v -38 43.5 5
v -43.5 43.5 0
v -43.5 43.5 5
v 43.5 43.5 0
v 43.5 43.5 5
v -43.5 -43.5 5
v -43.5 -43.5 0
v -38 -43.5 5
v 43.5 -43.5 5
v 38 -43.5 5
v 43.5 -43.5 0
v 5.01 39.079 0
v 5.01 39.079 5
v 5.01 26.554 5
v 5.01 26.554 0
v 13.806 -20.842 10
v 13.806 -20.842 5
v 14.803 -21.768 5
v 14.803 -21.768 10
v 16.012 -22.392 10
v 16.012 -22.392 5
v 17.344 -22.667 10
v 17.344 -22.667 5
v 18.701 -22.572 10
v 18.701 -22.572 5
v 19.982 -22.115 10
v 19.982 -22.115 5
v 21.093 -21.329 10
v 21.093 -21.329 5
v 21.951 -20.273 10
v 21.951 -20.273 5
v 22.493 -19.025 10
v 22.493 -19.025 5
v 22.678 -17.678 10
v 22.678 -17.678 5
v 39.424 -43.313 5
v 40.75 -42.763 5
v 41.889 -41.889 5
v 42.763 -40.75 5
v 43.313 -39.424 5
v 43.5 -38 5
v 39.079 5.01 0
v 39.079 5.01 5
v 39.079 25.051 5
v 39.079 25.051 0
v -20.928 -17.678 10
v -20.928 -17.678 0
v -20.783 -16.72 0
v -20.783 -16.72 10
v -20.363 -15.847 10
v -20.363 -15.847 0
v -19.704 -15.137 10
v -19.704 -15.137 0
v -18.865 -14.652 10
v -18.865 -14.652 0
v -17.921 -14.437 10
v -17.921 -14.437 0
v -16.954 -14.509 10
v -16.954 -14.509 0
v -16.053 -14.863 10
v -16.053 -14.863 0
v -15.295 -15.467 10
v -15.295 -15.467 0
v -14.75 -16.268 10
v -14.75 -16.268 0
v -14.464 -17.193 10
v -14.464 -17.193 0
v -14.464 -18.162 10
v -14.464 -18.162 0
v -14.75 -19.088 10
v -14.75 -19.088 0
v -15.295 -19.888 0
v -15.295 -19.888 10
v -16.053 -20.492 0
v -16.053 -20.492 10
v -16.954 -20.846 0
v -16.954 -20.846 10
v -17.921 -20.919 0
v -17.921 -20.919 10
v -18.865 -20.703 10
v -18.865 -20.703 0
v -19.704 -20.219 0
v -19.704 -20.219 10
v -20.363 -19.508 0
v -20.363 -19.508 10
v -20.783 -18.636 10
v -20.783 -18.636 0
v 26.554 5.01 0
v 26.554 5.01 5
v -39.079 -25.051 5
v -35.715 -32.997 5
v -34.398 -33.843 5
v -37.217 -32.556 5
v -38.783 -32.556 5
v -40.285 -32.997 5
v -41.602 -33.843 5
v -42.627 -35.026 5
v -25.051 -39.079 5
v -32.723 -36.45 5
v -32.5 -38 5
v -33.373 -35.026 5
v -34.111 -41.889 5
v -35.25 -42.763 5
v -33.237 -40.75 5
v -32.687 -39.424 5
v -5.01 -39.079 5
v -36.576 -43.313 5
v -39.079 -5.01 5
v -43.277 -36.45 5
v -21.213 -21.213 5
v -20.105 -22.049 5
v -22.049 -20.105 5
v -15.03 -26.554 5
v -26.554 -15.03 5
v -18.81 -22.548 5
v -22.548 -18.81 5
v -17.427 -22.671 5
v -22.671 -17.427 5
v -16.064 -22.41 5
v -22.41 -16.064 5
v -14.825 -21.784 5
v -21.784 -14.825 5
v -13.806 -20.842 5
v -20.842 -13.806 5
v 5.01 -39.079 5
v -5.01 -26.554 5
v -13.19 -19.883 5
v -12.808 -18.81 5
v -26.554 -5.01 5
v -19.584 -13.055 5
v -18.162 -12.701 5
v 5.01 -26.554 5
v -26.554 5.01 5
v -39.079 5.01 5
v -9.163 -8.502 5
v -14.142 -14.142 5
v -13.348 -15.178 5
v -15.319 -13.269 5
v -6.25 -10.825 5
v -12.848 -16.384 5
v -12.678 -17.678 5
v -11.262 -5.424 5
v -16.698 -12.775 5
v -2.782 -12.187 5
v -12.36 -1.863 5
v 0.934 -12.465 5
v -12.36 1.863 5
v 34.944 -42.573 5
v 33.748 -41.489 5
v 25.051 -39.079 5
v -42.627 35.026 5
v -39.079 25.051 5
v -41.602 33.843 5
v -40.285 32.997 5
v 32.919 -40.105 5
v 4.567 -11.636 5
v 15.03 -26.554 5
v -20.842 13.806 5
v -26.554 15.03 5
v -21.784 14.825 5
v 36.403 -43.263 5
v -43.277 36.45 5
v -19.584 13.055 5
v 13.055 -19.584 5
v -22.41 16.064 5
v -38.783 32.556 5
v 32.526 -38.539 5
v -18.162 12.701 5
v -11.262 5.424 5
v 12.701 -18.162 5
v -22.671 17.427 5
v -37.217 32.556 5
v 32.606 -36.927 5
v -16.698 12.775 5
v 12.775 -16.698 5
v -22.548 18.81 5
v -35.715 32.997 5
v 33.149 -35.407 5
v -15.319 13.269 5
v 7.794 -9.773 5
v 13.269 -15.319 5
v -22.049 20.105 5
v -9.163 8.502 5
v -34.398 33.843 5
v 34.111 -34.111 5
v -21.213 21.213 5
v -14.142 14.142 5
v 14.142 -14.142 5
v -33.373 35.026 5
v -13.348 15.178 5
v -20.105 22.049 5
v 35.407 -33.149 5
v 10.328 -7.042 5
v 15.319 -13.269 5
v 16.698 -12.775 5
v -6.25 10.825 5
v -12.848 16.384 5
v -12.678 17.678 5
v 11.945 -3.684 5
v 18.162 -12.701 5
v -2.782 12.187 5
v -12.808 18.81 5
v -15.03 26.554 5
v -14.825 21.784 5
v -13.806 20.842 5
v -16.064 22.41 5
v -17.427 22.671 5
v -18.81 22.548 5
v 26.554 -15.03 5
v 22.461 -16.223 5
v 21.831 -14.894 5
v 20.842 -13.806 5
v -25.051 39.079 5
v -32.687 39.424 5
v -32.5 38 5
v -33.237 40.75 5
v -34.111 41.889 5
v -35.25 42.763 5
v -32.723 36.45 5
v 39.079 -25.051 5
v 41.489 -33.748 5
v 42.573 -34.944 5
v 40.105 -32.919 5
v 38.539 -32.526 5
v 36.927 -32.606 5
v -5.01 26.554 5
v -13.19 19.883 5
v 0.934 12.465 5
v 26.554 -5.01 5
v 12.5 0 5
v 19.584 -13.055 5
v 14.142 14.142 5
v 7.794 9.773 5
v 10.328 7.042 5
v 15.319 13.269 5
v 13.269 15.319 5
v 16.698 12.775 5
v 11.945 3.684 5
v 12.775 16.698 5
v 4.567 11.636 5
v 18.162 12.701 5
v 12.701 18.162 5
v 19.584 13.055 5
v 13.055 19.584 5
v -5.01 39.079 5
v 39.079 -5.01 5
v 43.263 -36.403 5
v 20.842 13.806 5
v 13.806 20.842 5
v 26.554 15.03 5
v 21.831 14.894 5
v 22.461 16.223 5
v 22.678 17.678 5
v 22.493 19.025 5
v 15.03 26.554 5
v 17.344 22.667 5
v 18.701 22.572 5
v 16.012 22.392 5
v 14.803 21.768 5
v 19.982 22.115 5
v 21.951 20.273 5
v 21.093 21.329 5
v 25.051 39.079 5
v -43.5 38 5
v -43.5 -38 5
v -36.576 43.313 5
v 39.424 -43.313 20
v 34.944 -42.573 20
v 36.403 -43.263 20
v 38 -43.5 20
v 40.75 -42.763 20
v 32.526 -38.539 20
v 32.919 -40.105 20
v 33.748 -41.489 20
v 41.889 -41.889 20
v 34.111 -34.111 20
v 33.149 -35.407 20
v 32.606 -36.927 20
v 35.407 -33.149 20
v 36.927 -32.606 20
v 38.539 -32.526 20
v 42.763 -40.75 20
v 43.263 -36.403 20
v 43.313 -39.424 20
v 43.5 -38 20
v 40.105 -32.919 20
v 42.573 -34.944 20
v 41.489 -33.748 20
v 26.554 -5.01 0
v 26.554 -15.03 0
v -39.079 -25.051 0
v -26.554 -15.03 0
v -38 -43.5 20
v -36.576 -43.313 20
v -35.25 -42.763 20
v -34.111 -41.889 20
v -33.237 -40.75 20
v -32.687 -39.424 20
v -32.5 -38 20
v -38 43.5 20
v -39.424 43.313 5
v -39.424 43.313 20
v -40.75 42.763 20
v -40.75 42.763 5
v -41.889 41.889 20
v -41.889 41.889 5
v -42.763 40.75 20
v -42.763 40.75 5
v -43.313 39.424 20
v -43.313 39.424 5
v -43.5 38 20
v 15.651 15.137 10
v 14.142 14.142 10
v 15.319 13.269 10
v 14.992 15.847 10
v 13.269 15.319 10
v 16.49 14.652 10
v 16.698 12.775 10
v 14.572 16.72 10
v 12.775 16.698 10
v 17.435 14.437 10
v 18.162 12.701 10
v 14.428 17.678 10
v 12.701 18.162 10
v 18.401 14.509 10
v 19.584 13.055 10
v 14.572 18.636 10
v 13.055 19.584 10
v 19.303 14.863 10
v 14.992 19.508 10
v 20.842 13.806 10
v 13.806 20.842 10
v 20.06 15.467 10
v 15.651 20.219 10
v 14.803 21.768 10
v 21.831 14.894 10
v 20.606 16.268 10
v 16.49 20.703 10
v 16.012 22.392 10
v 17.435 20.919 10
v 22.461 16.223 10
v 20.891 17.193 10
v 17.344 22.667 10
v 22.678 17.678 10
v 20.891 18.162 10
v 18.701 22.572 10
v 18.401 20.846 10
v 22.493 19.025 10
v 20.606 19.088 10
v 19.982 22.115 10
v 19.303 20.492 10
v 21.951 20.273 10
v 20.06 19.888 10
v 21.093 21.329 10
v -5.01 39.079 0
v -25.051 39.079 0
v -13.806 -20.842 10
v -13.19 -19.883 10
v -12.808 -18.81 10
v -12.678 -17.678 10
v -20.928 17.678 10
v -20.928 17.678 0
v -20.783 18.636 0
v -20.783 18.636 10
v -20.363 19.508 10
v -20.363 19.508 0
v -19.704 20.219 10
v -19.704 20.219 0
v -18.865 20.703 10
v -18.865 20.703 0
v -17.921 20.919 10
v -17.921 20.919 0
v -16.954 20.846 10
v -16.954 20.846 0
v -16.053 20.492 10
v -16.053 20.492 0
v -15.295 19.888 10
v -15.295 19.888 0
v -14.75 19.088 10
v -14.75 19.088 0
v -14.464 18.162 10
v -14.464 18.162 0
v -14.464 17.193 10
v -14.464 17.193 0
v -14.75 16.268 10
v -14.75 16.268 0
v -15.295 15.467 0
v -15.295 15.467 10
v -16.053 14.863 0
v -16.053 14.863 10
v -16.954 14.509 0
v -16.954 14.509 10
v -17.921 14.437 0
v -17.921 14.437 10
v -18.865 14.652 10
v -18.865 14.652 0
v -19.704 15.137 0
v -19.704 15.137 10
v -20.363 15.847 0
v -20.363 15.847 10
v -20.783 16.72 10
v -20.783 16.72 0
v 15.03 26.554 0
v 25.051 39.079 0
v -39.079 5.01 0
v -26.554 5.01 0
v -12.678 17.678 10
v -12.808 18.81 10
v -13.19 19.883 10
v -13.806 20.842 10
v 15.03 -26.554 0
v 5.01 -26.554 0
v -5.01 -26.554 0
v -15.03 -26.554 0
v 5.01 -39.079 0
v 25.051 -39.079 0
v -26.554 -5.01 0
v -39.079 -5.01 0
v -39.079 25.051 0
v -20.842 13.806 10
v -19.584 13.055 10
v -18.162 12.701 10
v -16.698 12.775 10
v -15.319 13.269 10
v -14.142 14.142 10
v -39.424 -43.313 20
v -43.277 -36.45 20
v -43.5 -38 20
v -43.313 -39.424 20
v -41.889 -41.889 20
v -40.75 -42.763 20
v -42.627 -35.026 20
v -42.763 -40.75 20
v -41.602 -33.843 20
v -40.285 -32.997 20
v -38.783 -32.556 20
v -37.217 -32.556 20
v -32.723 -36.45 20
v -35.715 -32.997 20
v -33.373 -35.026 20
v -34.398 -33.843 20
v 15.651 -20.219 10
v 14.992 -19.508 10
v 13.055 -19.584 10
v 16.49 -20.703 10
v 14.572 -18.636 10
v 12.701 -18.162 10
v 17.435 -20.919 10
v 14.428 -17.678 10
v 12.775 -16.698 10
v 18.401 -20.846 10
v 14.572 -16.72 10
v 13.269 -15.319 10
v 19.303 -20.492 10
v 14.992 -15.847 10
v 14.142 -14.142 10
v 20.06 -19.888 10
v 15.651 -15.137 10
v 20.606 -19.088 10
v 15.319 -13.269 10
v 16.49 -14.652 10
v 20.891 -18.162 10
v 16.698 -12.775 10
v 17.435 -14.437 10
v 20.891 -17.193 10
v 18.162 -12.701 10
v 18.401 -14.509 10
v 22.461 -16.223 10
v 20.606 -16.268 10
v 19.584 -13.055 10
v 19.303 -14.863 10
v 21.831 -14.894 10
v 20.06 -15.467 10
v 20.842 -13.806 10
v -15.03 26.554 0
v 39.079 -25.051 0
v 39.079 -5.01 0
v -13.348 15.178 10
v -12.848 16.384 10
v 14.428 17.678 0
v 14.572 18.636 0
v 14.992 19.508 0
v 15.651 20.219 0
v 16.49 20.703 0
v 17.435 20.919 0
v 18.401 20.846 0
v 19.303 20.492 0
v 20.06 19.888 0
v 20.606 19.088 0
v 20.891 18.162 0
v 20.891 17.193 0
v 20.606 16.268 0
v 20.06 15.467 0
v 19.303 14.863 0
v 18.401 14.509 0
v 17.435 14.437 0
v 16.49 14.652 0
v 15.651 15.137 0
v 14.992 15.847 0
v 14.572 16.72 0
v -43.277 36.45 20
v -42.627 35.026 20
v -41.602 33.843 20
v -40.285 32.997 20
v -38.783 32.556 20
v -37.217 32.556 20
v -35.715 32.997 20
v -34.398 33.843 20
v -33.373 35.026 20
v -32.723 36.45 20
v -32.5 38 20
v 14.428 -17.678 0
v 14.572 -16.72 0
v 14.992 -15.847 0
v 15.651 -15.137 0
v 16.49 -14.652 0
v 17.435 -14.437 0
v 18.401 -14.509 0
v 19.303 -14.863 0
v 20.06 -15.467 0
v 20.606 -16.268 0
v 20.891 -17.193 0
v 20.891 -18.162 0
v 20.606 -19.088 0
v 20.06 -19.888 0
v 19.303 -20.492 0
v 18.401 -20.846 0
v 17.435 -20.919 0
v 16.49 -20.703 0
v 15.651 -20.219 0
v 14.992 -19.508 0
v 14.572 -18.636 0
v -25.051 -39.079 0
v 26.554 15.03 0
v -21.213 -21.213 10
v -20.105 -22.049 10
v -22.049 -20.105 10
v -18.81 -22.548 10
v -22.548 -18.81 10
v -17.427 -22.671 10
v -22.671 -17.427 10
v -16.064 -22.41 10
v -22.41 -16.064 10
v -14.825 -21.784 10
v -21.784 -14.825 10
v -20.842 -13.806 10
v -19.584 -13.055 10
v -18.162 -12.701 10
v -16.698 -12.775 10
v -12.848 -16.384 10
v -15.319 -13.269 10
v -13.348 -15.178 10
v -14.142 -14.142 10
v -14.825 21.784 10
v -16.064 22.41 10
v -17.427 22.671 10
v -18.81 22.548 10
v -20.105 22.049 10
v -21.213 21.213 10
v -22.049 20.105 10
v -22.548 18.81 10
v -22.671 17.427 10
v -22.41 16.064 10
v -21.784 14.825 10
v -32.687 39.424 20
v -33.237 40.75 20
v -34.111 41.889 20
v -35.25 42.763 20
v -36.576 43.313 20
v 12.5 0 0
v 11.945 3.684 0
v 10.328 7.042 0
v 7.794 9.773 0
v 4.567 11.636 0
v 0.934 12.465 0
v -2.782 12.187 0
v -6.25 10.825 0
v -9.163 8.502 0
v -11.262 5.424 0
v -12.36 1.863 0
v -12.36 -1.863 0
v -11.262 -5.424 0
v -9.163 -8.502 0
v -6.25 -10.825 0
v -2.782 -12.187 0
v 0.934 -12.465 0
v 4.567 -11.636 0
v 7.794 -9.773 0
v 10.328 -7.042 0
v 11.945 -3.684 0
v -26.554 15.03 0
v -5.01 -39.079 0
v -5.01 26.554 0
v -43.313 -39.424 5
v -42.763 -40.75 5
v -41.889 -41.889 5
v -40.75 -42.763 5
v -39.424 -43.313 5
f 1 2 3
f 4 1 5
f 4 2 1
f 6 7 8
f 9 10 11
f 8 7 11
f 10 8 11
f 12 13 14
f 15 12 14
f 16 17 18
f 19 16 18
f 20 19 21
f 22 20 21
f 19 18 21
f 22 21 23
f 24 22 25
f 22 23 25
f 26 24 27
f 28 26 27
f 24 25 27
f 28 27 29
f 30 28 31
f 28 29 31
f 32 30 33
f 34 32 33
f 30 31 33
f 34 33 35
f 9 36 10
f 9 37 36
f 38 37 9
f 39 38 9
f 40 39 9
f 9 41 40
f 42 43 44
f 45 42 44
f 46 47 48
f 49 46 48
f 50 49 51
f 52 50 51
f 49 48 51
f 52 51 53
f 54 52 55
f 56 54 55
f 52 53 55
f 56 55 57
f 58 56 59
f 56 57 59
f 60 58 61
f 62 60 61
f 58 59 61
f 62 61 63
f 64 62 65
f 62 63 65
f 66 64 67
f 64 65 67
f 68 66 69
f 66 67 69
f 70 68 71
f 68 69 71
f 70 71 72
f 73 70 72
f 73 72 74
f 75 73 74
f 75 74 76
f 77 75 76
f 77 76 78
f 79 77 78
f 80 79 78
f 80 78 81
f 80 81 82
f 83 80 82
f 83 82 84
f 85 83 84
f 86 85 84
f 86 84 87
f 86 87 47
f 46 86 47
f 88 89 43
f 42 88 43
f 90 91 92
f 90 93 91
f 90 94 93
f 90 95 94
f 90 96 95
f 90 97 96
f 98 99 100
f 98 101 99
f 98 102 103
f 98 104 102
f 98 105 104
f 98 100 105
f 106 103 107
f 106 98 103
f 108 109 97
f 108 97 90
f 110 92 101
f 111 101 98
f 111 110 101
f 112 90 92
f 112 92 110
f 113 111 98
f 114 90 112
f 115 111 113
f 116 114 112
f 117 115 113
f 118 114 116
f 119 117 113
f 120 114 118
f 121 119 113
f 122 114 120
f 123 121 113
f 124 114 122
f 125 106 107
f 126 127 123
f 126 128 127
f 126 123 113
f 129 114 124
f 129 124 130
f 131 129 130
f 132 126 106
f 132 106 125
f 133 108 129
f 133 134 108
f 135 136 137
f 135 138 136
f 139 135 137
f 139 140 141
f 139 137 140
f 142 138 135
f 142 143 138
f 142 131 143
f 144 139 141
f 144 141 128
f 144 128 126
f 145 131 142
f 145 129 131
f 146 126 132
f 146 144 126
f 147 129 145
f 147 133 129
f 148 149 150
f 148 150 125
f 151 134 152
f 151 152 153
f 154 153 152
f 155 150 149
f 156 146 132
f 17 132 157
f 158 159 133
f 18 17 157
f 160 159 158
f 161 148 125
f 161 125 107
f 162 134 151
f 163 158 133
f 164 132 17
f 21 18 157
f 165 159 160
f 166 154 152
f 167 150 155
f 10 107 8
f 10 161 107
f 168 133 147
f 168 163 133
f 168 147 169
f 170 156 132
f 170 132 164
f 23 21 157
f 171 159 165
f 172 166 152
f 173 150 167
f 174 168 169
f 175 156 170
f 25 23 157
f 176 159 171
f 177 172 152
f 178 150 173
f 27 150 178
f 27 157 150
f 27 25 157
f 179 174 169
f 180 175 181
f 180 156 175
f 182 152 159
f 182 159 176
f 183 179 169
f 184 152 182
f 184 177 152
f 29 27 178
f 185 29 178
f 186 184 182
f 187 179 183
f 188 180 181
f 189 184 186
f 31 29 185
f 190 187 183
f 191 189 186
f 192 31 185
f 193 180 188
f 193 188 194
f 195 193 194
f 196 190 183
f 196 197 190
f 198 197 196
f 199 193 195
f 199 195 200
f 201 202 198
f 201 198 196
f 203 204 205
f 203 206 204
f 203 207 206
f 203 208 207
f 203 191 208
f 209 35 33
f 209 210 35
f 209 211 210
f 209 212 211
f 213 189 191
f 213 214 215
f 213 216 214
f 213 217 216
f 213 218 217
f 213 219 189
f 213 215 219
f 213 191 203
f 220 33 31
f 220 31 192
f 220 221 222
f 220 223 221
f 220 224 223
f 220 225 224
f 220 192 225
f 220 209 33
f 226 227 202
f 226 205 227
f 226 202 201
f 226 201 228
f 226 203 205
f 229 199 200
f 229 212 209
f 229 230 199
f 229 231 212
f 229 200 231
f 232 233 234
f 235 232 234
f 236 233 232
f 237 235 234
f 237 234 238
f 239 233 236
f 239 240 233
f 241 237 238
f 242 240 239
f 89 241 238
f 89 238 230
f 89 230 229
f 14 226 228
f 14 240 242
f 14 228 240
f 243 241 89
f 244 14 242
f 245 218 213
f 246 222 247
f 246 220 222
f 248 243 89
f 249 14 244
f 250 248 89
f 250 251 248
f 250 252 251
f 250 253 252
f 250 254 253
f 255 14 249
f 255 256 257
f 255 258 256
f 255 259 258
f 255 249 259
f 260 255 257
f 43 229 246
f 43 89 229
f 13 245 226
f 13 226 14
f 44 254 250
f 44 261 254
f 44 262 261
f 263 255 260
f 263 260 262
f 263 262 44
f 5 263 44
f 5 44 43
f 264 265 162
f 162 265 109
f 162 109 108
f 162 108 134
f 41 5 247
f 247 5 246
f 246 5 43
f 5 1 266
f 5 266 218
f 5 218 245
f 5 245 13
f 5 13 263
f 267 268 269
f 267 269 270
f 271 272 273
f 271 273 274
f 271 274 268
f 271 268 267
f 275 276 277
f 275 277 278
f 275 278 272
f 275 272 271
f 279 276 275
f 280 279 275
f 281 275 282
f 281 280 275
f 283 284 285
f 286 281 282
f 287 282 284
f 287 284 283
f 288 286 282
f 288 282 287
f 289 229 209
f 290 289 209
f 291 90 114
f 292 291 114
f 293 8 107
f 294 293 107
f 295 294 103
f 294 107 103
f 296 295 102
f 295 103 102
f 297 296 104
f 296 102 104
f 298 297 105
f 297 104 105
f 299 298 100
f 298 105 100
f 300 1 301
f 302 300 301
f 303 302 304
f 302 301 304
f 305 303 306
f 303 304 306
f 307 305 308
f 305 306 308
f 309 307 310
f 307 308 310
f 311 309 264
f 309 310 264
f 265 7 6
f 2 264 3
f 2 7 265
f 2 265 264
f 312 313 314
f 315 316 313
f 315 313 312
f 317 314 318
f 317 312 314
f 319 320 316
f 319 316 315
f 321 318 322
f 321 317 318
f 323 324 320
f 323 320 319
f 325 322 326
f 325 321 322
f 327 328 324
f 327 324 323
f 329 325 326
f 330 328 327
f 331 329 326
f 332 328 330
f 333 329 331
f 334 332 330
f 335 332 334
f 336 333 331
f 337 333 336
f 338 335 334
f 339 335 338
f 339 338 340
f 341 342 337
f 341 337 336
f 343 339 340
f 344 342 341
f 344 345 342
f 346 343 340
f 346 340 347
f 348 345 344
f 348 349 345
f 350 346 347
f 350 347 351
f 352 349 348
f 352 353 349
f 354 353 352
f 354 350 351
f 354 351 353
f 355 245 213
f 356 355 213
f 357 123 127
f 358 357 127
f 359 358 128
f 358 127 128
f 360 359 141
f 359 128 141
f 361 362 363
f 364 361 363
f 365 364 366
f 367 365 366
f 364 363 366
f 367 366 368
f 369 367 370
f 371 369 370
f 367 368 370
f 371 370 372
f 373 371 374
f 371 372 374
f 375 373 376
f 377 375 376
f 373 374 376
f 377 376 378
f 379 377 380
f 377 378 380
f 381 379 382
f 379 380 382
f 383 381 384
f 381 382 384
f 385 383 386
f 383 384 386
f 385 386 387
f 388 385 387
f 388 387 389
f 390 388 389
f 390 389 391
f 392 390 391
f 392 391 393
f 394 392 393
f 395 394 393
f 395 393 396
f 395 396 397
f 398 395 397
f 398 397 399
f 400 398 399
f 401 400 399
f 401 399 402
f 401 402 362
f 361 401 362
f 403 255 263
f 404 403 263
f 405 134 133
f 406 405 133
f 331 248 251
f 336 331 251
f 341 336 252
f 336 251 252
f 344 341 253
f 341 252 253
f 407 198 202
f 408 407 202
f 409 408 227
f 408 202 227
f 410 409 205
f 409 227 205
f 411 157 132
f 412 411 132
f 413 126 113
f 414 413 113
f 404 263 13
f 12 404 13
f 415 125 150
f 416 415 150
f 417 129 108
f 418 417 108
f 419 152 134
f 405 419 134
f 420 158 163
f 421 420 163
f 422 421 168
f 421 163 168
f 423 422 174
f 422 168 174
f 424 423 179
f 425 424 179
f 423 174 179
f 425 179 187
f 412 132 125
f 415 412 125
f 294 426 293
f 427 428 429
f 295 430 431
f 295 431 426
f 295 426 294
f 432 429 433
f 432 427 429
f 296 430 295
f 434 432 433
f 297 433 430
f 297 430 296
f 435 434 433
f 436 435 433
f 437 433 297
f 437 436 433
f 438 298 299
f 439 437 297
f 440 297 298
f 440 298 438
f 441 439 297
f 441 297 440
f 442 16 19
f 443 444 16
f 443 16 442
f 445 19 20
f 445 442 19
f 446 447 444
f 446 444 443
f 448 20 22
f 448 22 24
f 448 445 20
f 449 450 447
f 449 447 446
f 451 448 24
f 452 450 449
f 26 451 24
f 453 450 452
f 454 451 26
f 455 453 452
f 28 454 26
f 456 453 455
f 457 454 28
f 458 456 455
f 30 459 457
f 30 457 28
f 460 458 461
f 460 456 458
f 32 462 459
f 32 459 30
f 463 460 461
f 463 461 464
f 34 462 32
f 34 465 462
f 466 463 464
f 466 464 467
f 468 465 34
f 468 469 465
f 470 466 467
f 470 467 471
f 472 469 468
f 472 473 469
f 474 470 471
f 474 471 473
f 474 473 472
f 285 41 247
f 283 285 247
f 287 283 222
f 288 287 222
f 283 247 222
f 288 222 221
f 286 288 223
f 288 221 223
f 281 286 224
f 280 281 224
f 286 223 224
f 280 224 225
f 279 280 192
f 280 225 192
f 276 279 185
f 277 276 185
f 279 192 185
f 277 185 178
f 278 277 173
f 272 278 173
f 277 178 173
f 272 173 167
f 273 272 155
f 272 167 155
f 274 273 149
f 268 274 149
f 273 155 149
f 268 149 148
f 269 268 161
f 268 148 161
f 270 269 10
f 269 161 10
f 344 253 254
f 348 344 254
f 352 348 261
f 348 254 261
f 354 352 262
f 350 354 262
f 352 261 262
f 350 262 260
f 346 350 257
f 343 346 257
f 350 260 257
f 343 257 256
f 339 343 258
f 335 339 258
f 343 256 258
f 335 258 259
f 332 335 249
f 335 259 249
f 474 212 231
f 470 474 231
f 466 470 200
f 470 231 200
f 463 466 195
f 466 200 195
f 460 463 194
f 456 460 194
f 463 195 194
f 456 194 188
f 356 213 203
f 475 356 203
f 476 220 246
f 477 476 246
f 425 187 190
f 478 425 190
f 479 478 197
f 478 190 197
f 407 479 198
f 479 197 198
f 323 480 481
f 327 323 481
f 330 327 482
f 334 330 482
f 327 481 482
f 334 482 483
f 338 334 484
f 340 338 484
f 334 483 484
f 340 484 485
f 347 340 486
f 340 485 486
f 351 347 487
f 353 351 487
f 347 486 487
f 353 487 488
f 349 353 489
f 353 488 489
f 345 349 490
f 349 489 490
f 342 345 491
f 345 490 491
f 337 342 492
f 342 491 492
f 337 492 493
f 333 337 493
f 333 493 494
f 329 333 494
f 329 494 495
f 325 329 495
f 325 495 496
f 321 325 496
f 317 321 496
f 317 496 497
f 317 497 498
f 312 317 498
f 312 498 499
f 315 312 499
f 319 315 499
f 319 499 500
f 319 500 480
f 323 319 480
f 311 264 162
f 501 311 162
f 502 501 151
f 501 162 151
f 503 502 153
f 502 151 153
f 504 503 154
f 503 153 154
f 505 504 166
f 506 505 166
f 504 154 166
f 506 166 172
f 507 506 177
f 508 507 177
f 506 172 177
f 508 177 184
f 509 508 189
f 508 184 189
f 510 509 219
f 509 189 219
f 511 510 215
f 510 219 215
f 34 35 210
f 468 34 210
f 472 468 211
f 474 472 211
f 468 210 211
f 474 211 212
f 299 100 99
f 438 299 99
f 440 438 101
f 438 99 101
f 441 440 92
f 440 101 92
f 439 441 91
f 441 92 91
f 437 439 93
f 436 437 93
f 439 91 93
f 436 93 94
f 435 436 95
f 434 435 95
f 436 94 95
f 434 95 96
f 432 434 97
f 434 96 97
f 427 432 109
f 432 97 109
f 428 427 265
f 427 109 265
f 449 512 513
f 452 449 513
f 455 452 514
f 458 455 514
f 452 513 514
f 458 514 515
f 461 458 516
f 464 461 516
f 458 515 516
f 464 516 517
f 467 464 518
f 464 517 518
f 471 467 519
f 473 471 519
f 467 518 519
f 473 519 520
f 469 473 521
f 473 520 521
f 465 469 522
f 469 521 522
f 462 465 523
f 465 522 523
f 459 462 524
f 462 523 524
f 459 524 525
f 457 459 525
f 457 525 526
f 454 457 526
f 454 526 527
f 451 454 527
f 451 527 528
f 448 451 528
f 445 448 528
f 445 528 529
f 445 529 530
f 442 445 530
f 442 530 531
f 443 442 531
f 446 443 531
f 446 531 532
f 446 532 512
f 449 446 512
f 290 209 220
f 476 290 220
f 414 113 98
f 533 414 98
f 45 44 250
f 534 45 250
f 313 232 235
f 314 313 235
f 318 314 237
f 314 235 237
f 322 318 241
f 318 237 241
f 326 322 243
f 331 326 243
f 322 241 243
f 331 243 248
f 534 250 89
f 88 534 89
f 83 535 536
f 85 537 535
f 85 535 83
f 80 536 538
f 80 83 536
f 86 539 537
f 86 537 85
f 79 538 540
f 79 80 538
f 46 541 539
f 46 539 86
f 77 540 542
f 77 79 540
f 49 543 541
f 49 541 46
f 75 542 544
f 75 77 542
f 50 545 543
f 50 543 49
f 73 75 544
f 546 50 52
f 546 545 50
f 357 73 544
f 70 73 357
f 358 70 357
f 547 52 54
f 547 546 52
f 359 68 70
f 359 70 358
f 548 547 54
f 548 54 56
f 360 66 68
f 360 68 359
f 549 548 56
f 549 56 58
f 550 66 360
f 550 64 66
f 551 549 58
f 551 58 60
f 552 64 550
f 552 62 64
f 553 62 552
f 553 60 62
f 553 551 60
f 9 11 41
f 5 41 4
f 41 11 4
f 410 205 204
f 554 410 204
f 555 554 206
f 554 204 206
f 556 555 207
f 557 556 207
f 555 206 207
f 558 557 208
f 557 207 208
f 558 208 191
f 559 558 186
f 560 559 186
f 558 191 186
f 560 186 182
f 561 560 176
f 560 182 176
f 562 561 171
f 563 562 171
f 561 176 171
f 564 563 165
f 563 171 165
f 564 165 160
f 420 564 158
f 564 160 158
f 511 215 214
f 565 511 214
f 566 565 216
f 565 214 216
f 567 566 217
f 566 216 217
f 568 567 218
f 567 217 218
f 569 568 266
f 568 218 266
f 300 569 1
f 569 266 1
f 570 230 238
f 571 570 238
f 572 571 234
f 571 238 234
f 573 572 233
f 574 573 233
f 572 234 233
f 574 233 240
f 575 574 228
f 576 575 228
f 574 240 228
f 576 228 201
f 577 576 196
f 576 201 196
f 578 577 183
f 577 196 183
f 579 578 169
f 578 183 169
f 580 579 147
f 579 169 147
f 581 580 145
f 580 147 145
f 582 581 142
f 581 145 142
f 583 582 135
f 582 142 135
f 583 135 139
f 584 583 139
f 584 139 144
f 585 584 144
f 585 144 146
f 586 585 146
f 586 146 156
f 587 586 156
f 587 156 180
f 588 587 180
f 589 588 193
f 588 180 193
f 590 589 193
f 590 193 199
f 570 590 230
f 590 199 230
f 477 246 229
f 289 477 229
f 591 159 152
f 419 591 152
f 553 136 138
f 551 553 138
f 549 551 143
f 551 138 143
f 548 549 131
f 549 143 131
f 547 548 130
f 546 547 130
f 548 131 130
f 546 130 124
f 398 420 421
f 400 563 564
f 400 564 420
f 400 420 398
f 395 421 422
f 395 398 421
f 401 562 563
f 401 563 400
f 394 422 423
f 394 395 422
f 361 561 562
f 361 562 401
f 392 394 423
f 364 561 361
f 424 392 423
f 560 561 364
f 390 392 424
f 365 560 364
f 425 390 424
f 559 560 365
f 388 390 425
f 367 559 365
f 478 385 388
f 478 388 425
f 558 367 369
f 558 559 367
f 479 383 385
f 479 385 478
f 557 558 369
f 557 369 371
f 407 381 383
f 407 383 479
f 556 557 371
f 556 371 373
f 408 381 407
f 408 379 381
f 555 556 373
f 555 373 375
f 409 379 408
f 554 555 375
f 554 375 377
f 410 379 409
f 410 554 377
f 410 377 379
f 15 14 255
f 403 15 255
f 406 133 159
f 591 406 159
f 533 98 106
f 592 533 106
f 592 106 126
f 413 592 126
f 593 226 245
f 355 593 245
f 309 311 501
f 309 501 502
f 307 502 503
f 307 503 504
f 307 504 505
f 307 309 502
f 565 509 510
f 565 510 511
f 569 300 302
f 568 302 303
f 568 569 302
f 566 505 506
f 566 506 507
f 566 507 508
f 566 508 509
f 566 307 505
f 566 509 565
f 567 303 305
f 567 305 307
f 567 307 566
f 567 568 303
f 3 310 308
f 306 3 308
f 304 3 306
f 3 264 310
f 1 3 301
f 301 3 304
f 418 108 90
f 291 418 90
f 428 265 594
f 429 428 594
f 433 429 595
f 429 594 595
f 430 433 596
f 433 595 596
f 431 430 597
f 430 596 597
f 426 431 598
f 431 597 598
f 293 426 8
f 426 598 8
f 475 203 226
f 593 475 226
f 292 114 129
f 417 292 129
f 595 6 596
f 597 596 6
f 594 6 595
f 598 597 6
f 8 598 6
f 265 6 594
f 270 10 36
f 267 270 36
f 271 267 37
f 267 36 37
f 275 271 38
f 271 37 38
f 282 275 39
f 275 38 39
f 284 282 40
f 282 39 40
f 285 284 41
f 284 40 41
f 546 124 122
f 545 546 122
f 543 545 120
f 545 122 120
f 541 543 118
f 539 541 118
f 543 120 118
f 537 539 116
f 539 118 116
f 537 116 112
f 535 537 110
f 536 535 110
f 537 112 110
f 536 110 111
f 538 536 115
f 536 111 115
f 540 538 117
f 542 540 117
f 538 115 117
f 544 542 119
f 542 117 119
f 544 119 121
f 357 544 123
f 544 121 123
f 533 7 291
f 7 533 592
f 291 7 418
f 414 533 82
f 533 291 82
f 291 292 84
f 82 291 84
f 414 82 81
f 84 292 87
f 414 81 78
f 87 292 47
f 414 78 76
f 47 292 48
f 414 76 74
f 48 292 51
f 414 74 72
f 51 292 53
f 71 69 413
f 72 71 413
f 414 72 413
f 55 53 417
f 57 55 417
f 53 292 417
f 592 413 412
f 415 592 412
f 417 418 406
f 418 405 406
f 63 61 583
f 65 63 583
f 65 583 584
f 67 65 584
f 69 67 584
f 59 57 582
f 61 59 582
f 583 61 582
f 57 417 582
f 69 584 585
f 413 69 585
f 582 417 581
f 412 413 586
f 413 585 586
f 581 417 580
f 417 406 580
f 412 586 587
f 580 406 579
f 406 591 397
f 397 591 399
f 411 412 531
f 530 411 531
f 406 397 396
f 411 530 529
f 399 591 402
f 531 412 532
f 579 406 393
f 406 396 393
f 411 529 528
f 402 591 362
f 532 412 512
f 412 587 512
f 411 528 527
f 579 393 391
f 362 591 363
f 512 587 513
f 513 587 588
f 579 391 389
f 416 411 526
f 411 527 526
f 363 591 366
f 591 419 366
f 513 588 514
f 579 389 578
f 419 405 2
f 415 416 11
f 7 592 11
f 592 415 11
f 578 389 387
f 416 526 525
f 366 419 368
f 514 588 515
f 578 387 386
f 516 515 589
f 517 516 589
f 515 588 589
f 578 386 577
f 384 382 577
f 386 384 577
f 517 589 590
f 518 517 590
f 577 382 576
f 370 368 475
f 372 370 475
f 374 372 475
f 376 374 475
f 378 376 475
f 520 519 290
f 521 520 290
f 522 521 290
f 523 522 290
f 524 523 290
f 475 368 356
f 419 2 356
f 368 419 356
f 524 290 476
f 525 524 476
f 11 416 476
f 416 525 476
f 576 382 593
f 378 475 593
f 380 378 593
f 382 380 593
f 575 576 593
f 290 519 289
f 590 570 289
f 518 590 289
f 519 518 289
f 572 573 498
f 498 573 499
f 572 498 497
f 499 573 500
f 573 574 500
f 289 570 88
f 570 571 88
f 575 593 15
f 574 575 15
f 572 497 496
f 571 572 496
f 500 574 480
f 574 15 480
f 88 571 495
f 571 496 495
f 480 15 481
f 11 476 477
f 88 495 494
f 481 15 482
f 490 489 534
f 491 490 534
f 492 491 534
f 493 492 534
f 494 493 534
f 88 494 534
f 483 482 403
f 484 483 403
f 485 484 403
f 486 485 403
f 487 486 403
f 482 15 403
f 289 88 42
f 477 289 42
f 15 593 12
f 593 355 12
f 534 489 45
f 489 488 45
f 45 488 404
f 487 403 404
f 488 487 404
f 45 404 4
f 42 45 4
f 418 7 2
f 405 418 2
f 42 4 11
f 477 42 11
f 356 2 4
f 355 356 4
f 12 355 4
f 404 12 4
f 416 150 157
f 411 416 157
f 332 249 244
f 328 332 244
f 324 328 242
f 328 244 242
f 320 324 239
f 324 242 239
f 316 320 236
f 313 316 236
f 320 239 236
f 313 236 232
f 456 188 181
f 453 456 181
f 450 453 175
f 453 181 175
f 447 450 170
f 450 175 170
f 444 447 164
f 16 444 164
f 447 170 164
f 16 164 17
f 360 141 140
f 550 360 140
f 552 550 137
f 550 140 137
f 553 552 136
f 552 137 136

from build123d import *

# Parameters (mm, degrees)
F0_W      = 87
F0_H      = 87
F1_DEPTH  = 5
F3_DEPTH  = 5
F6_D      = 6.5
F8_DEPTH  = 15
F9_R      = 12.5
F10_DEPTH = 5


with BuildPart() as f1:
    # F0 (on Top) → F1 (new body)
    with BuildSketch(Plane.XY):
        Rectangle(F0_W, F0_H)
    extrude(amount=F1_DEPTH)

    # F2 (on face) → F3 (join)
    with BuildSketch(Plane.XY.offset(5)):
        with BuildLine():
            ThreePointArc((-17.67767, 17.67767), (-15.821292, 19.356826), (-13.806304, 20.841928))
            ThreePointArc((-13.806304, 20.841928), (-21.213203, 21.213203), (-20.841928, 13.806304))
            ThreePointArc((-20.841928, 13.806304), (-19.356826, 15.821292), (-17.67767, 17.67767))
        make_face()
        with BuildLine():
            ThreePointArc((-20.841928, 13.806304), (-17.427356, 12.683939), (-14.142136, 14.142136))
            Line((-14.142136, 14.142136), (-17.67767, 17.67767))
            ThreePointArc((-17.67767, 17.67767), (-19.356826, 15.821292), (-20.841928, 13.806304))
        make_face()
        with BuildLine():
            ThreePointArc((-12.67767, 17.67767), (-12.968273, 19.357428), (-13.806304, 20.841928))
            ThreePointArc((-13.806304, 20.841928), (-15.821292, 19.356826), (-17.67767, 17.67767))
            Line((-17.67767, 17.67767), (-14.142136, 14.142136))
            ThreePointArc((-14.142136, 14.142136), (-13.058272, 15.764252), (-12.67767, 17.67767))
        make_face()
        with BuildLine():
            ThreePointArc((-12.67767, -17.67767), (-13.058272, -15.764252), (-14.142136, -14.142136))
            Line((-14.142136, -14.142136), (-17.67767, -17.67767))
            ThreePointArc((-17.67767, -17.67767), (-15.821292, -19.356826), (-13.806304, -20.841928))
            ThreePointArc((-13.806304, -20.841928), (-12.968273, -19.357428), (-12.67767, -17.67767))
        make_face()
        with BuildLine():
            Line((-17.67767, -17.67767), (-14.142136, -14.142136))
            ThreePointArc((-14.142136, -14.142136), (-17.427356, -12.683939), (-20.841928, -13.806304))
            ThreePointArc((-20.841928, -13.806304), (-19.356826, -15.821292), (-17.67767, -17.67767))
        make_face()
        with BuildLine():
            ThreePointArc((-20.841928, -13.806304), (-21.213203, -21.213203), (-13.806304, -20.841928))
            ThreePointArc((-13.806304, -20.841928), (-15.821292, -19.356826), (-17.67767, -17.67767))
            ThreePointArc((-17.67767, -17.67767), (-19.356826, -15.821292), (-20.841928, -13.806304))
        make_face()
        with BuildLine():
            ThreePointArc((13.806304, -20.841928), (15.821292, -19.356826), (17.67767, -17.67767))
            Line((17.67767, -17.67767), (14.142136, -14.142136))
            ThreePointArc((14.142136, -14.142136), (12.683939, -17.427356), (13.806304, -20.841928))
        make_face()
        with BuildLine():
            ThreePointArc((17.67767, -17.67767), (19.356826, -15.821292), (20.841928, -13.806304))
            ThreePointArc((20.841928, -13.806304), (17.427356, -12.683939), (14.142136, -14.142136))
            Line((14.142136, -14.142136), (17.67767, -17.67767))
        make_face()
        with BuildLine():
            ThreePointArc((22.67767, -17.67767), (22.195484, -15.535392), (20.841928, -13.806304))
            ThreePointArc((20.841928, -13.806304), (19.356826, -15.821292), (17.67767, -17.67767))
            ThreePointArc((17.67767, -17.67767), (15.821292, -19.356826), (13.806304, -20.841928))
            ThreePointArc((13.806304, -20.841928), (19.357428, -22.387066), (22.67767, -17.67767))
        make_face()
        with BuildLine():
            ThreePointArc((17.67767, 17.67767), (19.356826, 15.821292), (20.841928, 13.806304))
            ThreePointArc((20.841928, 13.806304), (22.195484, 15.535392), (22.67767, 17.67767))
            ThreePointArc((22.67767, 17.67767), (19.357428, 22.387066), (13.806304, 20.841928))
            ThreePointArc((13.806304, 20.841928), (15.821292, 19.356826), (17.67767, 17.67767))
        make_face()
        with BuildLine():
            ThreePointArc((14.142136, 14.142136), (17.427356, 12.683939), (20.841928, 13.806304))
            ThreePointArc((20.841928, 13.806304), (19.356826, 15.821292), (17.67767, 17.67767))
            Line((17.67767, 17.67767), (14.142136, 14.142136))
        make_face()
        with BuildLine():
            Line((14.142136, 14.142136), (17.67767, 17.67767))
            ThreePointArc((17.67767, 17.67767), (15.821292, 19.356826), (13.806304, 20.841928))
            ThreePointArc((13.806304, 20.841928), (12.683939, 17.427356), (14.142136, 14.142136))
        make_face()
    extrude(amount=F3_DEPTH)

    # F6 (through all)
    with Locations(Plane.XY.offset(10)):
        with Locations((-17.67767, 17.67767), (17.67767, 17.67767), (17.67767, -17.67767), (-17.67767, -17.67767)):
            Hole(F6_D / 2)

    # F7 (on face) → F8 (join)
    with BuildSketch(Plane.XY.offset(5)):
        with BuildLine():
            ThreePointArc((-43.5, 38), (-38, 32.5), (-32.5, 38))
            ThreePointArc((-32.5, 38), (-34.110913, 41.889087), (-38, 43.5))
            ThreePointArc((-38, 43.5), (-41.889087, 41.889087), (-43.5, 38))
        make_face()
        with BuildLine():
            ThreePointArc((-32.5, -38), (-38, -32.5), (-43.5, -38))
            ThreePointArc((-43.5, -38), (-41.889087, -41.889087), (-38, -43.5))
            ThreePointArc((-38, -43.5), (-34.110913, -41.889087), (-32.5, -38))
        make_face()
        with BuildLine():
            ThreePointArc((38, -43.5), (41.889087, -41.889087), (43.5, -38))
            ThreePointArc((43.5, -38), (34.110913, -34.110913), (38, -43.5))
        make_face()
    extrude(amount=F8_DEPTH)

    # F9 (on face) → F10 (cut)
    with BuildSketch(Plane.XY.offset(5)):
        Polygon((5.01014, 39.079089), (5.01014, 26.55374), (15.030419, 26.55374), (25.050698, 39.079089), align=None)
        Polygon((-5.01014, 39.079089), (-25.050698, 39.079089), (-15.030419, 26.55374), (-5.01014, 26.55374), align=None)
        Polygon((26.55374, 15.030419), (26.55374, 5.01014), (39.079089, 5.01014), (39.079089, 25.050698), align=None)
        Polygon((39.079089, -5.01014), (26.55374, -5.01014), (26.55374, -15.030419), (39.079089, -25.050698), align=None)
        Polygon((-15.030419, -26.55374), (-25.050698, -39.079089), (-5.01014, -39.079089), (-5.01014, -26.55374), align=None)
        Polygon((5.01014, -26.55374), (5.01014, -39.079089), (25.050698, -39.079089), (15.030419, -26.55374), align=None)
        Polygon((-26.55374, 5.01014), (-26.55374, 15.030419), (-39.079089, 25.050698), (-39.079089, 5.01014), align=None)
        Polygon((-26.55374, -5.01014), (-39.079089, -5.01014), (-39.079089, -25.050698), (-26.55374, -15.030419), align=None)
        Circle(F9_R)
    extrude(amount=-F10_DEPTH, mode=Mode.SUBTRACT)


solid = f1.part
